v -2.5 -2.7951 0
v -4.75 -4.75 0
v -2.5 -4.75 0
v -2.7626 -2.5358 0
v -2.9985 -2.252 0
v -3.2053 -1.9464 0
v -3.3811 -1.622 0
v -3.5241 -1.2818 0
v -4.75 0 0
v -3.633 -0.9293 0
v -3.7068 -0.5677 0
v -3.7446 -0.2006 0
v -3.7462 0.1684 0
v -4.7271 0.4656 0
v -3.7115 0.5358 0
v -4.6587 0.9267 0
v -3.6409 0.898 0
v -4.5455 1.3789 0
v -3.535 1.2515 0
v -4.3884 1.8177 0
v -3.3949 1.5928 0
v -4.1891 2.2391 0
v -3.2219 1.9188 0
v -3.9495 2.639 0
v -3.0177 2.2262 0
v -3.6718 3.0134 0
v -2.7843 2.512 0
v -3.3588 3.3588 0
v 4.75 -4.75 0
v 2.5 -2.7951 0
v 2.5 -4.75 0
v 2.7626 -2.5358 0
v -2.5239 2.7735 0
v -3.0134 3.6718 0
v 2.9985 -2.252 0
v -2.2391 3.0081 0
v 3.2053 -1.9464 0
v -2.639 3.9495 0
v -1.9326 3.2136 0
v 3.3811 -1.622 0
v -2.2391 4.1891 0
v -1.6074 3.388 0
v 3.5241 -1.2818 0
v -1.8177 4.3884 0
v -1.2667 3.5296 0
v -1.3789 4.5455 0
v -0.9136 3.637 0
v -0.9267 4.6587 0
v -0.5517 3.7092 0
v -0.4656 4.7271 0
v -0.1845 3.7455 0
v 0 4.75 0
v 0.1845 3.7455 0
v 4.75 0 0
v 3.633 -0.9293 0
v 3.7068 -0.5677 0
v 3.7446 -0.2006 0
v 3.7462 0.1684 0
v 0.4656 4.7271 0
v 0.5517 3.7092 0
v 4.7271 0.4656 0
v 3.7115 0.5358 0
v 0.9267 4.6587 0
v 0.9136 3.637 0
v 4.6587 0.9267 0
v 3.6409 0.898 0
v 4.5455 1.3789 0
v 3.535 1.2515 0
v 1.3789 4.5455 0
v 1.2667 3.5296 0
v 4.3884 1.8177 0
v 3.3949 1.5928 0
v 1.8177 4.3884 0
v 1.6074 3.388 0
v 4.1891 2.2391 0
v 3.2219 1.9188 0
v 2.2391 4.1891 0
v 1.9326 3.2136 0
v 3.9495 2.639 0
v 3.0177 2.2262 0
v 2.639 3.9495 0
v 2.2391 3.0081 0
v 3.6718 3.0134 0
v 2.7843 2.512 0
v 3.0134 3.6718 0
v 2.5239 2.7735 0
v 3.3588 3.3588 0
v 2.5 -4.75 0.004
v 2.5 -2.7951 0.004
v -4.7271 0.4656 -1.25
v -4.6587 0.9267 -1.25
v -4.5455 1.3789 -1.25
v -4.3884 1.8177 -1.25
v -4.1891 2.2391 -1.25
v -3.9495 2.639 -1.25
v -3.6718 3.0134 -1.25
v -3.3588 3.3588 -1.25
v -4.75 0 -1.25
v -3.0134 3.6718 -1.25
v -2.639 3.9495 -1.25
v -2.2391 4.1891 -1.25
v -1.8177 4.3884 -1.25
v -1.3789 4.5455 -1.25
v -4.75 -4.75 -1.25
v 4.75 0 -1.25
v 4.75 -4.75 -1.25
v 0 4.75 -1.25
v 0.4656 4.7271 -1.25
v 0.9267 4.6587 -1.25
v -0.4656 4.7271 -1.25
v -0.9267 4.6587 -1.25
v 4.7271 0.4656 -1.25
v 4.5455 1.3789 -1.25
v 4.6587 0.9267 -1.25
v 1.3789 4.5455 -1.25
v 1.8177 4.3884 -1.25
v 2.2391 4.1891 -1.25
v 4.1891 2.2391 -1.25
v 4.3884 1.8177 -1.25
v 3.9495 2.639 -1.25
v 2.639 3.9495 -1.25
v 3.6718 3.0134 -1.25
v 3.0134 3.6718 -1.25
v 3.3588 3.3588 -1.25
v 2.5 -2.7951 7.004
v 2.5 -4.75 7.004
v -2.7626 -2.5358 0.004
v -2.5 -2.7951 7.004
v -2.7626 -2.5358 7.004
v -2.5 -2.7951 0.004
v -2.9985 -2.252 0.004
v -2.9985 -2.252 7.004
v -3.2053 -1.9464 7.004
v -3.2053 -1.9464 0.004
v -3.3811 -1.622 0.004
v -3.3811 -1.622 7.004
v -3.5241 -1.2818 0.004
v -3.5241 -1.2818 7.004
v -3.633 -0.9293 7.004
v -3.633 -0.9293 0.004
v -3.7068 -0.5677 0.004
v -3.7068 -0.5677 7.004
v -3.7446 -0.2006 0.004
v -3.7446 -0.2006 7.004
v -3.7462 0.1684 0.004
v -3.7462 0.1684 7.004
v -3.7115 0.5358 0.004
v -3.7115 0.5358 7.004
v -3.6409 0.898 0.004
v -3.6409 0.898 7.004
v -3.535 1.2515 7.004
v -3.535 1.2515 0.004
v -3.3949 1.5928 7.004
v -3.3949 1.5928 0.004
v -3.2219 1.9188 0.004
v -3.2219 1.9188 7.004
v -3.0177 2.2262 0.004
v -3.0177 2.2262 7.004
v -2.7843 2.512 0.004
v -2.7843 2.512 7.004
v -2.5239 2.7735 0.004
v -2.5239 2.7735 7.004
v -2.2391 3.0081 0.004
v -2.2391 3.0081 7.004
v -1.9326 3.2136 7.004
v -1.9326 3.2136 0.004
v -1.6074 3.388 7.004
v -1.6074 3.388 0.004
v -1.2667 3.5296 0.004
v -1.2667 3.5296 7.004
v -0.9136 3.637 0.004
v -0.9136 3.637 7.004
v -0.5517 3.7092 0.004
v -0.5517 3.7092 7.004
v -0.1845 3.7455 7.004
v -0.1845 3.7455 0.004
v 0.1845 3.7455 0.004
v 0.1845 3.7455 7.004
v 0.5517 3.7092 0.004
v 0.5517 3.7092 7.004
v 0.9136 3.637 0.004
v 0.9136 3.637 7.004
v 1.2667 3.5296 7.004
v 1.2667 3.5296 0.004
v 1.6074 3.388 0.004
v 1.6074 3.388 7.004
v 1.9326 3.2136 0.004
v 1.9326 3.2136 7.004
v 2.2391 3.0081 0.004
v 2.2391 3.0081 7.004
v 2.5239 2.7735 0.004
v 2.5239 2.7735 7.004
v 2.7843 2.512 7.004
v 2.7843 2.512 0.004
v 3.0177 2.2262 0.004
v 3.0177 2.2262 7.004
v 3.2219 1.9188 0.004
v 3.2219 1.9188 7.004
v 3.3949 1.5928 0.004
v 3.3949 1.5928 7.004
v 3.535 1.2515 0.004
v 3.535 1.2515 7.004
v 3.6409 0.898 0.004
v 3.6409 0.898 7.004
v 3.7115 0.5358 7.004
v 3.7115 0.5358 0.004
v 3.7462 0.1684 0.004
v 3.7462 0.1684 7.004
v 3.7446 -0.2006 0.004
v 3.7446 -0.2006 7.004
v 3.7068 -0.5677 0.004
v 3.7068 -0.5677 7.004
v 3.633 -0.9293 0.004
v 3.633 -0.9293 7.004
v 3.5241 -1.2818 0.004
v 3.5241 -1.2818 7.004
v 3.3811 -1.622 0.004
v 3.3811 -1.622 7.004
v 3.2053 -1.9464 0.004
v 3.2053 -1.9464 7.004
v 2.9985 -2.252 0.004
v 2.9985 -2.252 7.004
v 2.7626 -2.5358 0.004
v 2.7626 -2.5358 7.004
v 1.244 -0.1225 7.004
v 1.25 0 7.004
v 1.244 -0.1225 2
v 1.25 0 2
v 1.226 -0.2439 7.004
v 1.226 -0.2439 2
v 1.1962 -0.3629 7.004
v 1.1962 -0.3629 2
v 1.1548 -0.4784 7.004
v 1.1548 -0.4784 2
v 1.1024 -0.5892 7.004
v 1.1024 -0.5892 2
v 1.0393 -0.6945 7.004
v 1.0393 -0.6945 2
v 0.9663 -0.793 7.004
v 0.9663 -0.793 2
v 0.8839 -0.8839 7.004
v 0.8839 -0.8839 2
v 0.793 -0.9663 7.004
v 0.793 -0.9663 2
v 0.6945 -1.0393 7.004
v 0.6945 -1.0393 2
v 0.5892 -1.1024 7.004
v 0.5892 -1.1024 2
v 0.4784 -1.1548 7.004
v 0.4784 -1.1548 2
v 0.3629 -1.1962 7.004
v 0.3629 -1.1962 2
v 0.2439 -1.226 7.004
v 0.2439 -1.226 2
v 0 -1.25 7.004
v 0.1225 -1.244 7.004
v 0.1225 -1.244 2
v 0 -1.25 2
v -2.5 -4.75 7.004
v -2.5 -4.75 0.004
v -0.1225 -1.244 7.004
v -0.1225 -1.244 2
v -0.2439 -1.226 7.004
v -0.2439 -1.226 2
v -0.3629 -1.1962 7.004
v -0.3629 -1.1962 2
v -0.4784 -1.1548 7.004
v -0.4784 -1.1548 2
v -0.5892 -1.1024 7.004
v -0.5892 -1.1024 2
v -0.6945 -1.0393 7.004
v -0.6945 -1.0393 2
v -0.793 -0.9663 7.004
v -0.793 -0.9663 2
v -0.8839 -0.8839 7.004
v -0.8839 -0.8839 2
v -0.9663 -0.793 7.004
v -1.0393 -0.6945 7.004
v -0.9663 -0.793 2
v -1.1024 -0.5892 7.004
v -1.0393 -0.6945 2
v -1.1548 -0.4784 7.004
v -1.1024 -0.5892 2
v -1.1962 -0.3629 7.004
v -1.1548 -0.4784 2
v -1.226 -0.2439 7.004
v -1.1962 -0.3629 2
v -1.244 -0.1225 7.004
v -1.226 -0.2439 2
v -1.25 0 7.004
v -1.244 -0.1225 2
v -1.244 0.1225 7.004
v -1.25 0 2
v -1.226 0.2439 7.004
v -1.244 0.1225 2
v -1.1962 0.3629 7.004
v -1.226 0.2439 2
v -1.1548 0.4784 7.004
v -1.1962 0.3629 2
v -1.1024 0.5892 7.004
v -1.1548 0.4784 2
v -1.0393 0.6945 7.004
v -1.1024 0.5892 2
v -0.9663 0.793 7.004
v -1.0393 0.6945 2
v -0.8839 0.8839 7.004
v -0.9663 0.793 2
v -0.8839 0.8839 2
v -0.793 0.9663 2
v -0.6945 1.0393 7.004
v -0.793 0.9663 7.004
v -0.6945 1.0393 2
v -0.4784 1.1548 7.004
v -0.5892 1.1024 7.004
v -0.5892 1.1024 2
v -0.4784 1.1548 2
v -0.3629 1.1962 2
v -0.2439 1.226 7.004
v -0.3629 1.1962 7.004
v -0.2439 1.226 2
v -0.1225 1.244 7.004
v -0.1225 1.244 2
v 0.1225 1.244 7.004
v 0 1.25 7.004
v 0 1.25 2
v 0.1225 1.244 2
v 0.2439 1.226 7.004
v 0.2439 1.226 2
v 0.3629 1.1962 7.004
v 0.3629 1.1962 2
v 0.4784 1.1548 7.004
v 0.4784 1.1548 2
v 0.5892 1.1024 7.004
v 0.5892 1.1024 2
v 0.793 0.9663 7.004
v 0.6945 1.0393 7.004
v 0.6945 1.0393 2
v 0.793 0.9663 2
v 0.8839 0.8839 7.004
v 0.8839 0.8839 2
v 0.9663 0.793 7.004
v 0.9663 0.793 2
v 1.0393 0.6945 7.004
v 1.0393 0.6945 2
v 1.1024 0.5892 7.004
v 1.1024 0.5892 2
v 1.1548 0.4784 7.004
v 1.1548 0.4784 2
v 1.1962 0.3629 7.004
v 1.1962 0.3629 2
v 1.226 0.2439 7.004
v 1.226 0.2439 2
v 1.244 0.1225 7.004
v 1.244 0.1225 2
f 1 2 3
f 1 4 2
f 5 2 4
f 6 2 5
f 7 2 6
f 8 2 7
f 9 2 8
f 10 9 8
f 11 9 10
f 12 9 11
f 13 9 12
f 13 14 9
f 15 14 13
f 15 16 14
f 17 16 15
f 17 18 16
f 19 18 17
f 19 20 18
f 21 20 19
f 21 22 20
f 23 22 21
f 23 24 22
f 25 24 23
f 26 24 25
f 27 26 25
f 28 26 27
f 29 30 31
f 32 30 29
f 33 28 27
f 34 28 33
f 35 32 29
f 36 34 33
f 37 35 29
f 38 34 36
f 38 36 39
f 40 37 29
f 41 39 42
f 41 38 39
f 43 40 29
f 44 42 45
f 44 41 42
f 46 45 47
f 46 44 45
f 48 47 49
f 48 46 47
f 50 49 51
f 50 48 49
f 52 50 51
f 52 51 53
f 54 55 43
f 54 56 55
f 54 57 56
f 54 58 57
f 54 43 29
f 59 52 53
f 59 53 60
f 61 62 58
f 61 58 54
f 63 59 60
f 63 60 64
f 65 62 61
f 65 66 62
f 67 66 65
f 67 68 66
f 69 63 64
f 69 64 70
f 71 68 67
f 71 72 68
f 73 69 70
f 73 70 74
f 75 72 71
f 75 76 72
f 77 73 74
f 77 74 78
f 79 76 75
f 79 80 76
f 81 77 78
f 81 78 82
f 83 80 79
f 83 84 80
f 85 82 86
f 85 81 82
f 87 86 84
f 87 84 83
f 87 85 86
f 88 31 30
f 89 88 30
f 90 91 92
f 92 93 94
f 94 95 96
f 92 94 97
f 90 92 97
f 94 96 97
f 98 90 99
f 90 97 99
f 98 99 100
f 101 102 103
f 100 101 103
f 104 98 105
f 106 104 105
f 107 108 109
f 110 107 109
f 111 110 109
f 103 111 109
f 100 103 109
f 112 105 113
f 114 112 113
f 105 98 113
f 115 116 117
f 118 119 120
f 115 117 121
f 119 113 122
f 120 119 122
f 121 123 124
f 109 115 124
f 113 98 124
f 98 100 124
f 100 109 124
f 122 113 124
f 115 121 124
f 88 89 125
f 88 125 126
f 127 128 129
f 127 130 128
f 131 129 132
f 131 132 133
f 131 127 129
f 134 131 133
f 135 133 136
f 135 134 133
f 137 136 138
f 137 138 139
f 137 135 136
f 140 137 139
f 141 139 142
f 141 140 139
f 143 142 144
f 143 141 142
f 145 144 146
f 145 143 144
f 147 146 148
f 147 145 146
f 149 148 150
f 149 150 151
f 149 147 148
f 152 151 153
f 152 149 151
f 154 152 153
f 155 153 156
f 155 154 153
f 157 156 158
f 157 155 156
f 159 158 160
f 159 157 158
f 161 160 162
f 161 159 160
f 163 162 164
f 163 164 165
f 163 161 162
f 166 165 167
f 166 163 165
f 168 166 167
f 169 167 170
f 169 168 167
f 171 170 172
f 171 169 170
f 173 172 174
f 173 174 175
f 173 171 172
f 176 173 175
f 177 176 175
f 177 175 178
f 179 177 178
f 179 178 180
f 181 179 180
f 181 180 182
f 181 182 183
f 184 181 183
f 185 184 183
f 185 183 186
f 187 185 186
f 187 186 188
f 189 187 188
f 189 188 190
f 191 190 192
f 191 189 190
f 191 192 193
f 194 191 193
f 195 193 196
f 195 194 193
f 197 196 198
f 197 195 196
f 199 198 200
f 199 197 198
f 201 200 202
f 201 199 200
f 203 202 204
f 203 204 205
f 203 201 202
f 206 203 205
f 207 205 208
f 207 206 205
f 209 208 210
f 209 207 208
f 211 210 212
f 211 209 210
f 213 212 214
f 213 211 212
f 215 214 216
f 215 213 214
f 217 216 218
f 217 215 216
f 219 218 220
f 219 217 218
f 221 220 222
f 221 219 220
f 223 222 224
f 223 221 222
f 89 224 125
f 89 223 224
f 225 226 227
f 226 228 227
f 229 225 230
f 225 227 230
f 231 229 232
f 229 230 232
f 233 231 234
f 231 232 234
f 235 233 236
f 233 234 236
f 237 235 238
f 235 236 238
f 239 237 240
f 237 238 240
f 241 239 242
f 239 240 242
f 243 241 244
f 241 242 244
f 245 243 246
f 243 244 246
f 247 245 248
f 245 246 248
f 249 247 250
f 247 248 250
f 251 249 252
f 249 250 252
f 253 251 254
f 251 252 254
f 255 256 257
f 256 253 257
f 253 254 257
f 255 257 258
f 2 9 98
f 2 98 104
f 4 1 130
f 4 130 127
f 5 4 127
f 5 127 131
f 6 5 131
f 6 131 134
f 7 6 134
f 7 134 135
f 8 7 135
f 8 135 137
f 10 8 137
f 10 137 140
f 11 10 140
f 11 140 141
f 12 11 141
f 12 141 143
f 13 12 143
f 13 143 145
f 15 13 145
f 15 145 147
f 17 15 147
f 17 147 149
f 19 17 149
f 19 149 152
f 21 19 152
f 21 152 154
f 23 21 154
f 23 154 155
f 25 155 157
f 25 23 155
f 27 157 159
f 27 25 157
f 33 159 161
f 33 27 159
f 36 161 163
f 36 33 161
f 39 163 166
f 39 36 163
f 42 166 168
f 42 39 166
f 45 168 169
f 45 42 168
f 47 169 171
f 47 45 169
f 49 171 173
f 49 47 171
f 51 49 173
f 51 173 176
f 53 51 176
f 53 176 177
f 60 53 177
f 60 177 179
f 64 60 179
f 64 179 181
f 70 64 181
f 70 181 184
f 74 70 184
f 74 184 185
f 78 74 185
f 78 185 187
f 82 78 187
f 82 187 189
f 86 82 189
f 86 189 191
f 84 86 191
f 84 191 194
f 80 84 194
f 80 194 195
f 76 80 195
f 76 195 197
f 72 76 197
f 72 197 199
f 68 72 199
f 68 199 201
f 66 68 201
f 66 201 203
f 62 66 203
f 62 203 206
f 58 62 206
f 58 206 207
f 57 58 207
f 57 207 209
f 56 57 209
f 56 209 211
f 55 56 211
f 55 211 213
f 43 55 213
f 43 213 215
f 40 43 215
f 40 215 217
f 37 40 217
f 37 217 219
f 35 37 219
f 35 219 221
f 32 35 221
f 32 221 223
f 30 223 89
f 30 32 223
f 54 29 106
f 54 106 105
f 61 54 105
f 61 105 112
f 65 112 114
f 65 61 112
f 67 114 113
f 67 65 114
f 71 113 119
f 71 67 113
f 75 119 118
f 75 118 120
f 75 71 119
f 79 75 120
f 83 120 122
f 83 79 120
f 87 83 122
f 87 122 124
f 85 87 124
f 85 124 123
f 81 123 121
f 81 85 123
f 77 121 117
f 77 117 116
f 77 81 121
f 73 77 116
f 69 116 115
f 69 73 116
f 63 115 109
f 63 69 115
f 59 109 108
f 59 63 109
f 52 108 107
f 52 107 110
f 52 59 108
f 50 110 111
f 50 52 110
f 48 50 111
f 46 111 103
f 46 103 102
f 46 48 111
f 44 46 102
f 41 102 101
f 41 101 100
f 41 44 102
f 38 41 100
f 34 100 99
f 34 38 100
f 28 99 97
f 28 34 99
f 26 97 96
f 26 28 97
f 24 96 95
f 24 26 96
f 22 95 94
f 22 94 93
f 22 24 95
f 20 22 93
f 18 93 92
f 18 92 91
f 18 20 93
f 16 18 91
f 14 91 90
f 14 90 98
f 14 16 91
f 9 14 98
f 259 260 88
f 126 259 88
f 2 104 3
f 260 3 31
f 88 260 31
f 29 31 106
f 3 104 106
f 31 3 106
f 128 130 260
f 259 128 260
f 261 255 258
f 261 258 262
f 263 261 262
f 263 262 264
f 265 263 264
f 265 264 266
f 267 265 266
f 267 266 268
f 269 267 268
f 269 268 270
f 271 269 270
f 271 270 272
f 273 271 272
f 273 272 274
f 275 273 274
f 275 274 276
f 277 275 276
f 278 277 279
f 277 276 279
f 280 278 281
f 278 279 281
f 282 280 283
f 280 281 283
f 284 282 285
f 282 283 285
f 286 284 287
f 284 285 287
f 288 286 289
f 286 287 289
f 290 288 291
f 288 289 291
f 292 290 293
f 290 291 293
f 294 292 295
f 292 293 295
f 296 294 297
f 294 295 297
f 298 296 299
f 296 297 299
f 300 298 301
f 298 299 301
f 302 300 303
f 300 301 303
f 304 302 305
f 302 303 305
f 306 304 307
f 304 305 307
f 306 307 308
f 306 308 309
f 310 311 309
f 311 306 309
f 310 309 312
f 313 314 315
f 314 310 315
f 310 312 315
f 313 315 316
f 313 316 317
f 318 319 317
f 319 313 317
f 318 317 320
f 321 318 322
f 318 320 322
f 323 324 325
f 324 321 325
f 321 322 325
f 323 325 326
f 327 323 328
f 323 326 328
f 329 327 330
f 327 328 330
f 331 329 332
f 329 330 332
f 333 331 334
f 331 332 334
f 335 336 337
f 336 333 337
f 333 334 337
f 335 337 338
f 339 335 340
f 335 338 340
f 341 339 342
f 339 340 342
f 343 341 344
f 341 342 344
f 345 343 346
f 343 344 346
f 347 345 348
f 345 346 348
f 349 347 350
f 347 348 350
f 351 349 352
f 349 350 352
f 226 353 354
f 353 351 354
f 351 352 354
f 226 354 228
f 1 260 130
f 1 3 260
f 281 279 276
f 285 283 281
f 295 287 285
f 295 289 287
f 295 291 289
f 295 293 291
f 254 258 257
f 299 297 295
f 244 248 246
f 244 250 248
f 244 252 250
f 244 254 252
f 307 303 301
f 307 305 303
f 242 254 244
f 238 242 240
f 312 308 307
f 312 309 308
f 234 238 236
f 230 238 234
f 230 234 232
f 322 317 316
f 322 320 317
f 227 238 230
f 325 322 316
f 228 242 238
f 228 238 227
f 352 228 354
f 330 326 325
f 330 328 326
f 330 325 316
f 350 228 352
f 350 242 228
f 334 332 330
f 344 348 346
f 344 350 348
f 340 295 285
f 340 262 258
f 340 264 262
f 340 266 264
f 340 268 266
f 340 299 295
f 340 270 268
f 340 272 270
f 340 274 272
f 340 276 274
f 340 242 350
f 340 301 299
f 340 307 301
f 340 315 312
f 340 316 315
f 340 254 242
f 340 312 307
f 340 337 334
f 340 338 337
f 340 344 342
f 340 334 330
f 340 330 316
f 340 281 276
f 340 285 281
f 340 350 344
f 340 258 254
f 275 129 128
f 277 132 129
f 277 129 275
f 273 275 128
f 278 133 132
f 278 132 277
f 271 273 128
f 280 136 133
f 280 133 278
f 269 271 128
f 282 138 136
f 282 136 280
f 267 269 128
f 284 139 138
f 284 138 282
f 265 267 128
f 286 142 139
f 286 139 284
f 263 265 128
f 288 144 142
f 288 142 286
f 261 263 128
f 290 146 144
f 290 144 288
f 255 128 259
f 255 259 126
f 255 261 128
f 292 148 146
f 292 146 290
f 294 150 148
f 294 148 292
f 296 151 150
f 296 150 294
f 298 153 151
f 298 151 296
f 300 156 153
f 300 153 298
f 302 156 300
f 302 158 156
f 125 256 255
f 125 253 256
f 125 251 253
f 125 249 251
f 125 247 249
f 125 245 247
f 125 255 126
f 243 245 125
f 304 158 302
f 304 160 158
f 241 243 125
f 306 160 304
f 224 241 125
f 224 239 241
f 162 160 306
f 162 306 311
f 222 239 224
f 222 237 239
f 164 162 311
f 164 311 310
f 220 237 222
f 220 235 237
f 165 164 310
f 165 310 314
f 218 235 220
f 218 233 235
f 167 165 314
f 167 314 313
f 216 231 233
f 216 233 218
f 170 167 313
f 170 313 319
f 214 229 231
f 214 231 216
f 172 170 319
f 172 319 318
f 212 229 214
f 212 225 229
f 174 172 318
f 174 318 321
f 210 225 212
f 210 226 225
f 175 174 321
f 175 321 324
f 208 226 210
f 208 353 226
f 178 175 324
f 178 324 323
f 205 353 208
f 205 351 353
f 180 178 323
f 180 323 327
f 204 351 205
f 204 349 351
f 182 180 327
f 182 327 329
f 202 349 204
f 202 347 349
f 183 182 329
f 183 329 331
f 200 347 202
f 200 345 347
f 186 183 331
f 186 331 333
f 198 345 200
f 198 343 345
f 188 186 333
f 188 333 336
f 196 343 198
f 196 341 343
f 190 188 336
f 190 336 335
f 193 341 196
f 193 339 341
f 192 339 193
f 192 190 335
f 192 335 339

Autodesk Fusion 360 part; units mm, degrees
sketch "Sketch1" plane through (0, 0, 0) normal (0, 0, 1) x (1, 0, 0)
  circle A0 centre (0, 0) radius 3.75
  circle A1 centre (0, 0) radius 1.25
  circle A2 centre (0, 0) radius 4.75
  line L0 (0, 0) -> (0, -4.75)
  line L1 (0, -4.75) -> (2.5, -4.75)
  line L2 (0, -4.75) -> (-2.5, -4.75)
  line L3 (2.5, -4.75) -> (2.5, -2.7951)
  line L4 (-2.5, -4.75) -> (-2.5, -2.7951)
  line L5 (2.5, -4.75) -> (4.75, -4.75)
  line L6 (4.75, -4.75) -> (4.75, 0)
  line L7 (-4.75, 0) -> (-4.75, -4.75)
  line L8 (-4.75, -4.75) -> (-2.5, -4.75)
  dimension "d1" = 7.5
  dimension "d2" = 2.5
  dimension "d3" = 9.5
  dimension "d4" = 2.5
  dimension "d5" = 2.5
  dimension "d10" = 2.25
extrude "Extrude1" add sketch "Sketch1" along normal blind 5 contours A0 | A0 A2 L0 L4 | A0 A2 L0 L3 | A2 L2 L4 | A2 L1 L3
extrude "Extrude2" add sketch "Sketch1" along normal blind 2 contours A1
extrude "Extrude3" add sketch "Sketch1" against normal blind 1.25 contours A1 | A0 | A0 A2 L3 L4 | A0 A2 L0 L4 | A0 A2 L0 L3 | A2 L4 L7 L8 | A2 L2 L4 | A2 L1 L3 | A2 L3 L5 L6
extrude "Extrude4" add 1 faces at (-0.9543, -2.5804, 5) along direction (0, 0, 1) blind 6.444
extrude "Extrude5" cut 1 faces at (-0.9543, -2.5804, 11.444) along direction (0, 0, -1) blind 11.44
extrude "Extrude6" add 1 faces at (-0.9543, -2.5804, 0.004) along direction (0, 0, 1) blind 7
